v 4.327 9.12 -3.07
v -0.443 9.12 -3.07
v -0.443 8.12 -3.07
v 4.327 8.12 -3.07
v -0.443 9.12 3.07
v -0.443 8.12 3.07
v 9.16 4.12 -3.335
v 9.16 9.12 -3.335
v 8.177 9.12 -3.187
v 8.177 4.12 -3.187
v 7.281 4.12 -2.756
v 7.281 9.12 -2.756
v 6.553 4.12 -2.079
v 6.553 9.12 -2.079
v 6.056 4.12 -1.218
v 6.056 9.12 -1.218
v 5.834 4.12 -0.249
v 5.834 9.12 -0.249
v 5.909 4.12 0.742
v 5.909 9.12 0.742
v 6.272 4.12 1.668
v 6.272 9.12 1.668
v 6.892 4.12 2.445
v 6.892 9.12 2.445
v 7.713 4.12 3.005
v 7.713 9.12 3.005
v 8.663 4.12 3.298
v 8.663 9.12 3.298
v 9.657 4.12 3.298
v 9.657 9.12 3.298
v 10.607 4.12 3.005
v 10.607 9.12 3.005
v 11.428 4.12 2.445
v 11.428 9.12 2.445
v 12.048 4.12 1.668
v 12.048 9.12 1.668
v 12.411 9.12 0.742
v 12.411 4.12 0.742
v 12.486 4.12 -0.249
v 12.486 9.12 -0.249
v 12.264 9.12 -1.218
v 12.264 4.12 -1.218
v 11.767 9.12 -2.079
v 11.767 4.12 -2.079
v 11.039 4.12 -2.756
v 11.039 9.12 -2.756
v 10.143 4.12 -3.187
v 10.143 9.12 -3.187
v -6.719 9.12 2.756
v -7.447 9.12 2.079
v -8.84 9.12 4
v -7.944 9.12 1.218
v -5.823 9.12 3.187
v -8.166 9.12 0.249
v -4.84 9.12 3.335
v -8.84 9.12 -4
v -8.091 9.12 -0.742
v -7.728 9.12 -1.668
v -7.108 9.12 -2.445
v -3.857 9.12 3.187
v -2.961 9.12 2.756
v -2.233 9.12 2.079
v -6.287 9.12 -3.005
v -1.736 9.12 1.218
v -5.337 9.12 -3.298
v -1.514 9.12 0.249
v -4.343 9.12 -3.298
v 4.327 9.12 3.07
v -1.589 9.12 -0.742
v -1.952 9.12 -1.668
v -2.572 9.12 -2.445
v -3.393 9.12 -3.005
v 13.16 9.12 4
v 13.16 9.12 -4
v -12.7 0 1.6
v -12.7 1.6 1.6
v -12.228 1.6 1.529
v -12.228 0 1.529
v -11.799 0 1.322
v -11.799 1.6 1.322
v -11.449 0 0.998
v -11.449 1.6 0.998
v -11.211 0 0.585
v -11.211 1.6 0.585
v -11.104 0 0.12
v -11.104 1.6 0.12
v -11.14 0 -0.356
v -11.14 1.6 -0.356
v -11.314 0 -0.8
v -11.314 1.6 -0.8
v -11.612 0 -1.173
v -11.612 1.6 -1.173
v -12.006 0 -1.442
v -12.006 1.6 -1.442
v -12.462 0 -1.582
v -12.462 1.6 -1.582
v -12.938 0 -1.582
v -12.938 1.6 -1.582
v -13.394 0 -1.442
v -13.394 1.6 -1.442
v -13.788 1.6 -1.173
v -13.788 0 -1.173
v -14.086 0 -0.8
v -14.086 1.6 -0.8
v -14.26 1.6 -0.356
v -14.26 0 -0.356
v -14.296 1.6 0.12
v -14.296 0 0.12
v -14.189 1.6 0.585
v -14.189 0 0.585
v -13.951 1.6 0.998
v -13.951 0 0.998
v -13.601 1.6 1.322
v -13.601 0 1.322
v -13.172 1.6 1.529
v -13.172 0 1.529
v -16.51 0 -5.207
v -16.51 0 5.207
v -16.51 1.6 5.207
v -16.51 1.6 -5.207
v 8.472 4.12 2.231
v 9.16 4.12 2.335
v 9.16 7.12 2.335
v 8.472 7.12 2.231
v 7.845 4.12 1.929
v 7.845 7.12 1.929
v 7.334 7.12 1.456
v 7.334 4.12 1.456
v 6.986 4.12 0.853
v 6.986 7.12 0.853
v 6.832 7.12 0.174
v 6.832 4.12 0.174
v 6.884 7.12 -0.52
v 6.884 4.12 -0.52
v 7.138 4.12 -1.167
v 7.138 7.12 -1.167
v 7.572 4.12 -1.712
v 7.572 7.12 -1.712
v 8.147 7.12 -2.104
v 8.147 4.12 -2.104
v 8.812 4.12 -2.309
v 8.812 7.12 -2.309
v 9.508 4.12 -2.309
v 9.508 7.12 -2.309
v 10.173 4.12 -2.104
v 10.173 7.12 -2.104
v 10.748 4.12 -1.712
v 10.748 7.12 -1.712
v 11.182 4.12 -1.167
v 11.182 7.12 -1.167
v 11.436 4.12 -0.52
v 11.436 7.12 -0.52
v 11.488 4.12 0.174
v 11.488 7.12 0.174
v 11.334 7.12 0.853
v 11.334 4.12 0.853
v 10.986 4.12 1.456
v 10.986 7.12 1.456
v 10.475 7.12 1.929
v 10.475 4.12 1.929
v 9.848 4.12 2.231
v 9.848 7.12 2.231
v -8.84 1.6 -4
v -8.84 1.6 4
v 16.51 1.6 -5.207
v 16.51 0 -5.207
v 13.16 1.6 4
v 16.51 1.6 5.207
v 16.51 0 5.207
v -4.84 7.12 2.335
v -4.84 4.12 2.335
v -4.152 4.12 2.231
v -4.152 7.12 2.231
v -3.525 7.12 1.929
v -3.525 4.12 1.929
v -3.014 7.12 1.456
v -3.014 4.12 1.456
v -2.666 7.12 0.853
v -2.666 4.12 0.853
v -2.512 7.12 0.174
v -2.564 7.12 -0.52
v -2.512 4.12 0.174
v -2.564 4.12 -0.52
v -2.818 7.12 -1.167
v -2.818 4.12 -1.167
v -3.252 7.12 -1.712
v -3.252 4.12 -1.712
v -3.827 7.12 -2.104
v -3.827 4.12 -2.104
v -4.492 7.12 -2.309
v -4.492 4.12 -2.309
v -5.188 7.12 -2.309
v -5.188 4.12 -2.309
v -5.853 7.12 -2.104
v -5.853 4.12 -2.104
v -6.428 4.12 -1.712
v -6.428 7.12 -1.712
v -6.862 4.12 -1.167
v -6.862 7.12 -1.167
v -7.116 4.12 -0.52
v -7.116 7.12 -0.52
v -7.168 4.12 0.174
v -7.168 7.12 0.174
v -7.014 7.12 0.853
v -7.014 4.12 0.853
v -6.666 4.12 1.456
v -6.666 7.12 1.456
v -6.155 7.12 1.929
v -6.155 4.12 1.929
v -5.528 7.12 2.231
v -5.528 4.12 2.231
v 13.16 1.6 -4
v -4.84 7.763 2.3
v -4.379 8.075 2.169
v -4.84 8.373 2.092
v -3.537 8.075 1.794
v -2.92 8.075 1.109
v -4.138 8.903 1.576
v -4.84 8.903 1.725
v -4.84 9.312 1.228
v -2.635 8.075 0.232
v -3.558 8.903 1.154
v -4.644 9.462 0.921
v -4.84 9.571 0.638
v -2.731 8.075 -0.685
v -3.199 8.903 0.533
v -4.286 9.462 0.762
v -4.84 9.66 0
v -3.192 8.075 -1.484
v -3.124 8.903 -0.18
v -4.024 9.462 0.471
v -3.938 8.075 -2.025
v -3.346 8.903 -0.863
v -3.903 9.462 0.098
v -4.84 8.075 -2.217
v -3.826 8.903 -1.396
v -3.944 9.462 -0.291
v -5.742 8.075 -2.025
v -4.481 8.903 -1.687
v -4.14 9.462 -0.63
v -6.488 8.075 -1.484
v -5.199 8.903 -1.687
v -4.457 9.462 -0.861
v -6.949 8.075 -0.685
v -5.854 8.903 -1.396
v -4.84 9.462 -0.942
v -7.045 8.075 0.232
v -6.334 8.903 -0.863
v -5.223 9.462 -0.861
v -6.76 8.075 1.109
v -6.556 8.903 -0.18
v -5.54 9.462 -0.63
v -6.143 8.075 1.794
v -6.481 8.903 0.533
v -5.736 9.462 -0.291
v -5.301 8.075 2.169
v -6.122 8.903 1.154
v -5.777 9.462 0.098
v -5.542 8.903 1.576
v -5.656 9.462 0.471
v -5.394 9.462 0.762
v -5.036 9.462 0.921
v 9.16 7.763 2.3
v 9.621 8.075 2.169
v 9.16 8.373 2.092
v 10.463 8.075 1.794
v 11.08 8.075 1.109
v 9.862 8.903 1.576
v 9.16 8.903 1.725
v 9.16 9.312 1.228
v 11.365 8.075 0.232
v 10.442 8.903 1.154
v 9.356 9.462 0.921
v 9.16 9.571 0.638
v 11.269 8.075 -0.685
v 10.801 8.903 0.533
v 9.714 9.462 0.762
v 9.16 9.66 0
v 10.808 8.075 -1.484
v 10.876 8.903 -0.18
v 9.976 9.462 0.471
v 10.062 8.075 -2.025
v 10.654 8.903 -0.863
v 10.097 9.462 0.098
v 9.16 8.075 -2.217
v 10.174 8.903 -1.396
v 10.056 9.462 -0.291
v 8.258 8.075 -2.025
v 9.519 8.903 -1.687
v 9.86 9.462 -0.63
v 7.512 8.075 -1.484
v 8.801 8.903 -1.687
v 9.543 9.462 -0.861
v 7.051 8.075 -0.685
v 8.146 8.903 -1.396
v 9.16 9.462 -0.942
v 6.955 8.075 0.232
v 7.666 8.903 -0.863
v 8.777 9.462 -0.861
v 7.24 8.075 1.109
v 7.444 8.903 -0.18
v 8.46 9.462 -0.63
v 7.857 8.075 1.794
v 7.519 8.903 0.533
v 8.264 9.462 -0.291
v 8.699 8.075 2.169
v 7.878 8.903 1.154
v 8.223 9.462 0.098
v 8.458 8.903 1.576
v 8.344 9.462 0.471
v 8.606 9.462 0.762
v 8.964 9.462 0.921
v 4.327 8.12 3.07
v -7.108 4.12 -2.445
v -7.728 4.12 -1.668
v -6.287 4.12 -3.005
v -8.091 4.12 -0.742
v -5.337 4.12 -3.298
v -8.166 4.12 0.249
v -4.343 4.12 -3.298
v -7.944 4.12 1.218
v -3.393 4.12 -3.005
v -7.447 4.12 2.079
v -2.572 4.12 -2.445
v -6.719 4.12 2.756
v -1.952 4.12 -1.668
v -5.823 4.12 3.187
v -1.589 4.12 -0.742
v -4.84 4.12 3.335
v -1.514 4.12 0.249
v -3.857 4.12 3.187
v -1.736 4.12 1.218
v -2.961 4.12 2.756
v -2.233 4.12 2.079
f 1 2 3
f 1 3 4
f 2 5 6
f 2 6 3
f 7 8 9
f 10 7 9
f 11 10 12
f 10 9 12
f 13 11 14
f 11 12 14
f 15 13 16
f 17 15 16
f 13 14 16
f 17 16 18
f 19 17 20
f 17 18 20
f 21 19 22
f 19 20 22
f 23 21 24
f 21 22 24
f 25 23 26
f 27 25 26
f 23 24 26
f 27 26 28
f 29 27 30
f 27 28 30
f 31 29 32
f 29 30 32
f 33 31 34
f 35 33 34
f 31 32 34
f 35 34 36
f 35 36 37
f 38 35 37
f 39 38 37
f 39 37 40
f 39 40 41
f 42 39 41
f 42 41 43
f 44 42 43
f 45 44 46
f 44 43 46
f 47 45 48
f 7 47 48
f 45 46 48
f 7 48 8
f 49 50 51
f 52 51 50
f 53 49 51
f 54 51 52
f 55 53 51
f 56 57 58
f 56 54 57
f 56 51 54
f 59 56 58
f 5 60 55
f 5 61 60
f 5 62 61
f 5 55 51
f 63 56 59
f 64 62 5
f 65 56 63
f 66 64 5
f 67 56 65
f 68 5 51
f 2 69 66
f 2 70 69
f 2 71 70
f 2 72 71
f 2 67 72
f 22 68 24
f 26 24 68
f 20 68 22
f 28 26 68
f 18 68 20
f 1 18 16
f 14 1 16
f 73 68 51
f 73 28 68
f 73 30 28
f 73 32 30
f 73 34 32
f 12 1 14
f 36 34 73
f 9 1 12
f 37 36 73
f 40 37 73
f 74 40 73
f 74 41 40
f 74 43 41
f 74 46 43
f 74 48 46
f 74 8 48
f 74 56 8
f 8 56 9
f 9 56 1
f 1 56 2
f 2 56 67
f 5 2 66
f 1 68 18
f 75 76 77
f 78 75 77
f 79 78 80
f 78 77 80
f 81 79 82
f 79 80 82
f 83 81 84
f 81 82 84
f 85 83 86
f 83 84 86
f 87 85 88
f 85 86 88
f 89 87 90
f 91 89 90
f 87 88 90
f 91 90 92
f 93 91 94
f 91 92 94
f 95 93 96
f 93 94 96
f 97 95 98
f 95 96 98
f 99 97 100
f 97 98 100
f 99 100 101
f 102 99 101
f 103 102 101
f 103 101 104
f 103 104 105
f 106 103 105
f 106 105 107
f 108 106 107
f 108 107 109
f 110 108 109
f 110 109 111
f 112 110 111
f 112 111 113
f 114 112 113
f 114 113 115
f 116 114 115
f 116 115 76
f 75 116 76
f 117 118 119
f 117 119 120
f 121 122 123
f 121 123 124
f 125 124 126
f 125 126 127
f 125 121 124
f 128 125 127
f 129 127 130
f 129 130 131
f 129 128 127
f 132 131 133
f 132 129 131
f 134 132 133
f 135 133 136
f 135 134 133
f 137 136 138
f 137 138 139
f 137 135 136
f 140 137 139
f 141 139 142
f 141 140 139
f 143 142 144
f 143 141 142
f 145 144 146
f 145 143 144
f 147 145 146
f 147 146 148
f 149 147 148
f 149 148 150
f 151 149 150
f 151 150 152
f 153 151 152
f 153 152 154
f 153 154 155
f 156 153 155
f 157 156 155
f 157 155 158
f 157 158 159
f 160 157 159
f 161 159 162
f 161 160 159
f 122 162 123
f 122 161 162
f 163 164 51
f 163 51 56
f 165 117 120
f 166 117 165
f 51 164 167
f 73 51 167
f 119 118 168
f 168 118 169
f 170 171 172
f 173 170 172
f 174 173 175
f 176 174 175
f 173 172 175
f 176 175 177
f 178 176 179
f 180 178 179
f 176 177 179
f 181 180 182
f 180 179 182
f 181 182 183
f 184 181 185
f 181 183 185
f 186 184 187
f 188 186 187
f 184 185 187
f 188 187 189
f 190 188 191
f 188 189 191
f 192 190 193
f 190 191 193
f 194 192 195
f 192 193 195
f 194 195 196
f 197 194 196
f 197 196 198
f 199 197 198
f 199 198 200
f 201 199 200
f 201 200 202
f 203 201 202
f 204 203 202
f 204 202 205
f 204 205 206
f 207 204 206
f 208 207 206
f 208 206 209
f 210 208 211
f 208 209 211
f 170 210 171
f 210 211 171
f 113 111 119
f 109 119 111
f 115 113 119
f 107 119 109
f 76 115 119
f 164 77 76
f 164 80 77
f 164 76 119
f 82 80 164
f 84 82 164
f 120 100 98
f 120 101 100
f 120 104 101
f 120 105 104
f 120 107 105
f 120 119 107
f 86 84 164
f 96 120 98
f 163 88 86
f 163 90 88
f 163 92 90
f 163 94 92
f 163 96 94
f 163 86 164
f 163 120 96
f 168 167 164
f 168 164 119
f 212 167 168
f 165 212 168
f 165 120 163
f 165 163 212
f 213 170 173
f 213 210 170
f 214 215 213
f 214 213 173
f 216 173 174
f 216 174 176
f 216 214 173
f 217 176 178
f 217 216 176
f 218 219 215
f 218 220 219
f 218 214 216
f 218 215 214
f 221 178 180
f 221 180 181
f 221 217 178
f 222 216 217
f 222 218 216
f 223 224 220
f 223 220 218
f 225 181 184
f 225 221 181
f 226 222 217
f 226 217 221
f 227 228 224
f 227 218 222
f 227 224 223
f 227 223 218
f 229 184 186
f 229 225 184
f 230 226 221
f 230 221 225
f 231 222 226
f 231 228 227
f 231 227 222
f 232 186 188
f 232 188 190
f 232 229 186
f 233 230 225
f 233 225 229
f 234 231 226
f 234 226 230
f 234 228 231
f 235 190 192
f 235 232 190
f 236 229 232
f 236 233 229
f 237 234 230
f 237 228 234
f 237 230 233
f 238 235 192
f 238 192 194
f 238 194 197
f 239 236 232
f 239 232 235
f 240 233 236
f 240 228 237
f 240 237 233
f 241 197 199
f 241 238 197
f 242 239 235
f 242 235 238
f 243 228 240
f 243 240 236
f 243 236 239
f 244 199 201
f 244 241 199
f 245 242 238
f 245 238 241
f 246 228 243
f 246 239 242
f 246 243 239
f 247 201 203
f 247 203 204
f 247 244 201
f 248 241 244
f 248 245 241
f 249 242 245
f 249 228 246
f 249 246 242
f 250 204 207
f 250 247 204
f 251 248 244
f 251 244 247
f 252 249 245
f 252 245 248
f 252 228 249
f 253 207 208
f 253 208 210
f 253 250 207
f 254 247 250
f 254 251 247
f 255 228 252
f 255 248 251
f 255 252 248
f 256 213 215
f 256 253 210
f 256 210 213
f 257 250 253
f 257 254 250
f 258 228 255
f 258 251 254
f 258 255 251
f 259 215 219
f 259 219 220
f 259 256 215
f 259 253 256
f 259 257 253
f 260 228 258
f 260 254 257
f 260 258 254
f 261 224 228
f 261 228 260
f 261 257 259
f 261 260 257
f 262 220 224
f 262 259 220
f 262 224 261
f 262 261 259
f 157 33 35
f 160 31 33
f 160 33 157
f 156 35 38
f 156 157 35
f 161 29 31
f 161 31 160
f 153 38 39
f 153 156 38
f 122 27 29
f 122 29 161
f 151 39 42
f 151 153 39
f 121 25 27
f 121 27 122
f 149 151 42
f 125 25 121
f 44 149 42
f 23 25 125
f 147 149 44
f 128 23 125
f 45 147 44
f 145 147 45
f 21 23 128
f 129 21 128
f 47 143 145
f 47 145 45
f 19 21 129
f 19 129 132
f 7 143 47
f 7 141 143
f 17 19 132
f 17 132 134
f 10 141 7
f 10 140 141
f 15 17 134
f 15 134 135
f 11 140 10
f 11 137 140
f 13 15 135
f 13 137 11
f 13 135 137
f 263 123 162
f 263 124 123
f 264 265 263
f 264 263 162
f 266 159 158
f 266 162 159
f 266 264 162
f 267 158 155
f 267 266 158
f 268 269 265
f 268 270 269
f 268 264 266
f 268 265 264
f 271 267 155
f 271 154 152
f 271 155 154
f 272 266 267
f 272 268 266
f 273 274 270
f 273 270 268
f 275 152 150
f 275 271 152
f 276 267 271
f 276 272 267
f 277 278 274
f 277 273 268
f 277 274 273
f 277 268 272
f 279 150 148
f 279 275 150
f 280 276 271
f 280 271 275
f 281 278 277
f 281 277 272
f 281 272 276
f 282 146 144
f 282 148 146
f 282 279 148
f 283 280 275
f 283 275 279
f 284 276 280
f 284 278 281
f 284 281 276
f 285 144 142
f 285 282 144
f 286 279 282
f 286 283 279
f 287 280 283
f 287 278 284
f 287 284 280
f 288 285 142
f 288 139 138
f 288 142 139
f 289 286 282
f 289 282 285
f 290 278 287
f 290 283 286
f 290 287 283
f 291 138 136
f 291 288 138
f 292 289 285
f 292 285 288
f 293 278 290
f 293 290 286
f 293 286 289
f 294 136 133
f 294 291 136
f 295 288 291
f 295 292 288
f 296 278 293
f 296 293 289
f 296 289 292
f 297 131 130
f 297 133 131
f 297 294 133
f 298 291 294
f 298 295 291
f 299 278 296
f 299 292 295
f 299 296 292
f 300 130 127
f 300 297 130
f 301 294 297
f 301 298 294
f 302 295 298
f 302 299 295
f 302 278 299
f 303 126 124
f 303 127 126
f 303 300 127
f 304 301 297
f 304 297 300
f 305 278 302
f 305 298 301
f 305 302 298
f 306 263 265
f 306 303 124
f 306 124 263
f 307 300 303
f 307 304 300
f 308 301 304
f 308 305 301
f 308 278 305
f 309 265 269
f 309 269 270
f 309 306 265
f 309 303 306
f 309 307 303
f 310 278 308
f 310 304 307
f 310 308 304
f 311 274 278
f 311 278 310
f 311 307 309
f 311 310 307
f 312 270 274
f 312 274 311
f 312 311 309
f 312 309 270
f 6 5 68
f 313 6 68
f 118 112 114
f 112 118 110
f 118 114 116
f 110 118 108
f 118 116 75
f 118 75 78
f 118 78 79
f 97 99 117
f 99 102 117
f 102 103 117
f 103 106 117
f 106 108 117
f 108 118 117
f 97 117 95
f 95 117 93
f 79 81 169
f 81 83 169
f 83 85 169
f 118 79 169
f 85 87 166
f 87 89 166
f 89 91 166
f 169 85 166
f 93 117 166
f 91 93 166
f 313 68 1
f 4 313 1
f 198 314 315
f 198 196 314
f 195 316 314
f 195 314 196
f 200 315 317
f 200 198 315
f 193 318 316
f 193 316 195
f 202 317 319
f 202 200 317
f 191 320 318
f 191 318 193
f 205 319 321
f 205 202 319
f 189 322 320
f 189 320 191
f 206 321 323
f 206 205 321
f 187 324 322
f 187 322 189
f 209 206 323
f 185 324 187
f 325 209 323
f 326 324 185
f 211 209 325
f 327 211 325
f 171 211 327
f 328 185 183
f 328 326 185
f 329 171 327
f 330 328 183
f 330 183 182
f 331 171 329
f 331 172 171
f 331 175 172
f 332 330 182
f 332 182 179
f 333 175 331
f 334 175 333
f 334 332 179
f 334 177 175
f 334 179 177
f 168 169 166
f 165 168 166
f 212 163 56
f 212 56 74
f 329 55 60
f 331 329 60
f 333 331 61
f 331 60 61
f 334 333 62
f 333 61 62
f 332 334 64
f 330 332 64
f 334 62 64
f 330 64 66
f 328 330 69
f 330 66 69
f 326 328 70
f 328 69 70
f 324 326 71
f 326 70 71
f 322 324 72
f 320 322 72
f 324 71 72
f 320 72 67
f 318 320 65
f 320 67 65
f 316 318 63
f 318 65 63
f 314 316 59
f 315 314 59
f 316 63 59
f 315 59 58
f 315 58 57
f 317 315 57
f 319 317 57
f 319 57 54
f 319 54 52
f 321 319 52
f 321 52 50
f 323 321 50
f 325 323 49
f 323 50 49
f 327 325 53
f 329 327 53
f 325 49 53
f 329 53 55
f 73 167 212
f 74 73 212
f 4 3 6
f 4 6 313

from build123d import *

# Parameters (mm, degrees)
SKETCH1_W                  = 33.02
SKETCH1_H                  = 10.414
BOSS_EXTRUDE1_DEPTH        = 1.6
SKETCH2_R                  = 1.6
CUT_EXTRUDE1_DEPTH         = 18.385423463
SKETCH3_W                  = 22
SKETCH3_H                  = 8
BOSS_EXTRUDE2_DEPTH        = 7.52
SKETCH5_R                  = 3.335
CUT_EXTRUDE2_DEPTH         = 5
SKETCH6_R                  = 2.334999968
BOSS_EXTRUDE3_DEPTH        = 3
DOME1_FACE_RADIUS          = 2.334999968
DOME1_HEIGHT               = 2.54
MIRROR1_COPY_1_FACE_RADIUS = 2.334999968
MIRROR1_COPY_1_HEIGHT      = 2.54
SKETCH7_W                  = 4.77
SKETCH7_H                  = 6.139999912
CUT_EXTRUDE3_DEPTH         = 1


with BuildPart() as part:
    # Sketch1 → Boss-Extrude1 (new body)
    with BuildSketch(Plane(origin=(0, 0, 0), x_dir=(1, 0, 0), z_dir=(0, 1, 0))):
        Rectangle(SKETCH1_W, SKETCH1_H)
    extrude(amount=BOSS_EXTRUDE1_DEPTH)

    # Sketch2 → Cut-Extrude1 (cut, through all)
    with BuildSketch(Plane(origin=(0, 1.6, 0), x_dir=(1, 0, 0), z_dir=(0, 1, 0))):
        with Locations(Location((-12.7, 0, 0), (0, 0, 270))):
            Circle(SKETCH2_R)
    extrude(amount=-CUT_EXTRUDE1_DEPTH, mode=Mode.SUBTRACT)

    # Sketch3 → Boss-Extrude2 (add)
    with BuildSketch(Plane(origin=(0, 1.6, 0), x_dir=(1, 0, 0), z_dir=(0, 1, 0))):
        with Locations((2.16, 0)):
            Rectangle(SKETCH3_W, SKETCH3_H)
    extrude(amount=BOSS_EXTRUDE2_DEPTH)

    # Sketch5 → Cut-Extrude2 (cut)
    with BuildSketch(Plane(origin=(0, 9.12, 0), x_dir=(1, 0, 0), z_dir=(0, 1, 0))):
        with Locations(Location((-4.84, 0, 0), (0, 0, 270))):
            Circle(SKETCH5_R)
        with Locations(Location((9.16, 0, 0), (0, 0, 90))):
            Circle(SKETCH5_R)
    extrude(amount=-CUT_EXTRUDE2_DEPTH, mode=Mode.SUBTRACT)

    # Sketch6 → Boss-Extrude3 (add)
    with BuildSketch(Plane(origin=(0, 4.12, 0), x_dir=(1, 0, 0), z_dir=(0, 1, 0))):
        with Locations(Location((-4.84, 0, 0), (0, 0, 270))):
            Circle(SKETCH6_R)
    boss_extrude3 = extrude(amount=BOSS_EXTRUDE3_DEPTH)

    # Dome1: a dome of height H over a round flat face of radius A is a cap of a sphere of radius (A * A + H * H) / (2 * H)
    dome1_r = (DOME1_FACE_RADIUS * DOME1_FACE_RADIUS + DOME1_HEIGHT * DOME1_HEIGHT) / (2 * DOME1_HEIGHT)
    dome1_base = Plane((-4.84, 7.12, 0), z_dir=(0, 1, 0))
    with Locations(dome1_base.offset(DOME1_HEIGHT - dome1_r)):
        dome1_ball = Sphere(dome1_r, mode=Mode.PRIVATE)
    add(split(dome1_ball, bisect_by=dome1_base, keep=Keep.TOP, mode=Mode.PRIVATE))

    # Mirror1: Boss-Extrude3 across plane
    add(boss_extrude3.mirror(Plane(origin=(2.16, 0, 0), x_dir=(0, 0, 1), z_dir=(1, 0, 0))))

    # Mirror1 copy 1: a dome of height H over a round flat face of radius A is a cap of a sphere of radius (A * A + H * H) / (2 * H)
    mirror1_copy_1_r = (MIRROR1_COPY_1_FACE_RADIUS * MIRROR1_COPY_1_FACE_RADIUS + MIRROR1_COPY_1_HEIGHT * MIRROR1_COPY_1_HEIGHT) / (2 * MIRROR1_COPY_1_HEIGHT)
    mirror1_copy_1_base = Plane((9.16, 7.12, 0), z_dir=(0, 1, 0))
    with Locations(mirror1_copy_1_base.offset(MIRROR1_COPY_1_HEIGHT - mirror1_copy_1_r)):
        mirror1_copy_1_ball = Sphere(mirror1_copy_1_r, mode=Mode.PRIVATE)
    add(split(mirror1_copy_1_ball, bisect_by=mirror1_copy_1_base, keep=Keep.TOP, mode=Mode.PRIVATE))

    # Sketch7 → Cut-Extrude3 (cut)
    with BuildSketch(Plane(origin=(0, 9.12, 0), x_dir=(1, 0, 0), z_dir=(0, 1, 0))):
        with Locations((1.942220891, 0)):
            Rectangle(SKETCH7_W, SKETCH7_H)
    extrude(amount=-CUT_EXTRUDE3_DEPTH, mode=Mode.SUBTRACT)


solid = part.part
